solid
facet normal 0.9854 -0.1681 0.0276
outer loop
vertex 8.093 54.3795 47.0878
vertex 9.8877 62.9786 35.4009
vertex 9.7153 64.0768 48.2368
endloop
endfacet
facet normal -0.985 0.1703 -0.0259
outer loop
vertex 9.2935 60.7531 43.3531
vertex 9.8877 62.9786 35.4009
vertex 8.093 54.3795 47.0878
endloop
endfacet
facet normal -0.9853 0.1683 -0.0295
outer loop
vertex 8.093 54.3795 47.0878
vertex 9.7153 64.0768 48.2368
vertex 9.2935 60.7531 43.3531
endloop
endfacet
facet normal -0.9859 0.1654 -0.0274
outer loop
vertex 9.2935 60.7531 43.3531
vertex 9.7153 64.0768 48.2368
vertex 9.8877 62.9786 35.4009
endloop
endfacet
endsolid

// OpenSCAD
// Auto-generated auxetic polyhedron
points = [
    [9.715274, 64.076828, 48.236771],
    [9.887683, 62.978571, 35.400940],
    [8.093019, 54.379506, 47.087789],
    [9.293530, 60.753097, 43.353114],
];

faces = [
    [0, 1, 2],
    [2, 1, 3],
    [3, 0, 2],
    [1, 0, 3],
];

polyhedron(points = points, faces = faces);
